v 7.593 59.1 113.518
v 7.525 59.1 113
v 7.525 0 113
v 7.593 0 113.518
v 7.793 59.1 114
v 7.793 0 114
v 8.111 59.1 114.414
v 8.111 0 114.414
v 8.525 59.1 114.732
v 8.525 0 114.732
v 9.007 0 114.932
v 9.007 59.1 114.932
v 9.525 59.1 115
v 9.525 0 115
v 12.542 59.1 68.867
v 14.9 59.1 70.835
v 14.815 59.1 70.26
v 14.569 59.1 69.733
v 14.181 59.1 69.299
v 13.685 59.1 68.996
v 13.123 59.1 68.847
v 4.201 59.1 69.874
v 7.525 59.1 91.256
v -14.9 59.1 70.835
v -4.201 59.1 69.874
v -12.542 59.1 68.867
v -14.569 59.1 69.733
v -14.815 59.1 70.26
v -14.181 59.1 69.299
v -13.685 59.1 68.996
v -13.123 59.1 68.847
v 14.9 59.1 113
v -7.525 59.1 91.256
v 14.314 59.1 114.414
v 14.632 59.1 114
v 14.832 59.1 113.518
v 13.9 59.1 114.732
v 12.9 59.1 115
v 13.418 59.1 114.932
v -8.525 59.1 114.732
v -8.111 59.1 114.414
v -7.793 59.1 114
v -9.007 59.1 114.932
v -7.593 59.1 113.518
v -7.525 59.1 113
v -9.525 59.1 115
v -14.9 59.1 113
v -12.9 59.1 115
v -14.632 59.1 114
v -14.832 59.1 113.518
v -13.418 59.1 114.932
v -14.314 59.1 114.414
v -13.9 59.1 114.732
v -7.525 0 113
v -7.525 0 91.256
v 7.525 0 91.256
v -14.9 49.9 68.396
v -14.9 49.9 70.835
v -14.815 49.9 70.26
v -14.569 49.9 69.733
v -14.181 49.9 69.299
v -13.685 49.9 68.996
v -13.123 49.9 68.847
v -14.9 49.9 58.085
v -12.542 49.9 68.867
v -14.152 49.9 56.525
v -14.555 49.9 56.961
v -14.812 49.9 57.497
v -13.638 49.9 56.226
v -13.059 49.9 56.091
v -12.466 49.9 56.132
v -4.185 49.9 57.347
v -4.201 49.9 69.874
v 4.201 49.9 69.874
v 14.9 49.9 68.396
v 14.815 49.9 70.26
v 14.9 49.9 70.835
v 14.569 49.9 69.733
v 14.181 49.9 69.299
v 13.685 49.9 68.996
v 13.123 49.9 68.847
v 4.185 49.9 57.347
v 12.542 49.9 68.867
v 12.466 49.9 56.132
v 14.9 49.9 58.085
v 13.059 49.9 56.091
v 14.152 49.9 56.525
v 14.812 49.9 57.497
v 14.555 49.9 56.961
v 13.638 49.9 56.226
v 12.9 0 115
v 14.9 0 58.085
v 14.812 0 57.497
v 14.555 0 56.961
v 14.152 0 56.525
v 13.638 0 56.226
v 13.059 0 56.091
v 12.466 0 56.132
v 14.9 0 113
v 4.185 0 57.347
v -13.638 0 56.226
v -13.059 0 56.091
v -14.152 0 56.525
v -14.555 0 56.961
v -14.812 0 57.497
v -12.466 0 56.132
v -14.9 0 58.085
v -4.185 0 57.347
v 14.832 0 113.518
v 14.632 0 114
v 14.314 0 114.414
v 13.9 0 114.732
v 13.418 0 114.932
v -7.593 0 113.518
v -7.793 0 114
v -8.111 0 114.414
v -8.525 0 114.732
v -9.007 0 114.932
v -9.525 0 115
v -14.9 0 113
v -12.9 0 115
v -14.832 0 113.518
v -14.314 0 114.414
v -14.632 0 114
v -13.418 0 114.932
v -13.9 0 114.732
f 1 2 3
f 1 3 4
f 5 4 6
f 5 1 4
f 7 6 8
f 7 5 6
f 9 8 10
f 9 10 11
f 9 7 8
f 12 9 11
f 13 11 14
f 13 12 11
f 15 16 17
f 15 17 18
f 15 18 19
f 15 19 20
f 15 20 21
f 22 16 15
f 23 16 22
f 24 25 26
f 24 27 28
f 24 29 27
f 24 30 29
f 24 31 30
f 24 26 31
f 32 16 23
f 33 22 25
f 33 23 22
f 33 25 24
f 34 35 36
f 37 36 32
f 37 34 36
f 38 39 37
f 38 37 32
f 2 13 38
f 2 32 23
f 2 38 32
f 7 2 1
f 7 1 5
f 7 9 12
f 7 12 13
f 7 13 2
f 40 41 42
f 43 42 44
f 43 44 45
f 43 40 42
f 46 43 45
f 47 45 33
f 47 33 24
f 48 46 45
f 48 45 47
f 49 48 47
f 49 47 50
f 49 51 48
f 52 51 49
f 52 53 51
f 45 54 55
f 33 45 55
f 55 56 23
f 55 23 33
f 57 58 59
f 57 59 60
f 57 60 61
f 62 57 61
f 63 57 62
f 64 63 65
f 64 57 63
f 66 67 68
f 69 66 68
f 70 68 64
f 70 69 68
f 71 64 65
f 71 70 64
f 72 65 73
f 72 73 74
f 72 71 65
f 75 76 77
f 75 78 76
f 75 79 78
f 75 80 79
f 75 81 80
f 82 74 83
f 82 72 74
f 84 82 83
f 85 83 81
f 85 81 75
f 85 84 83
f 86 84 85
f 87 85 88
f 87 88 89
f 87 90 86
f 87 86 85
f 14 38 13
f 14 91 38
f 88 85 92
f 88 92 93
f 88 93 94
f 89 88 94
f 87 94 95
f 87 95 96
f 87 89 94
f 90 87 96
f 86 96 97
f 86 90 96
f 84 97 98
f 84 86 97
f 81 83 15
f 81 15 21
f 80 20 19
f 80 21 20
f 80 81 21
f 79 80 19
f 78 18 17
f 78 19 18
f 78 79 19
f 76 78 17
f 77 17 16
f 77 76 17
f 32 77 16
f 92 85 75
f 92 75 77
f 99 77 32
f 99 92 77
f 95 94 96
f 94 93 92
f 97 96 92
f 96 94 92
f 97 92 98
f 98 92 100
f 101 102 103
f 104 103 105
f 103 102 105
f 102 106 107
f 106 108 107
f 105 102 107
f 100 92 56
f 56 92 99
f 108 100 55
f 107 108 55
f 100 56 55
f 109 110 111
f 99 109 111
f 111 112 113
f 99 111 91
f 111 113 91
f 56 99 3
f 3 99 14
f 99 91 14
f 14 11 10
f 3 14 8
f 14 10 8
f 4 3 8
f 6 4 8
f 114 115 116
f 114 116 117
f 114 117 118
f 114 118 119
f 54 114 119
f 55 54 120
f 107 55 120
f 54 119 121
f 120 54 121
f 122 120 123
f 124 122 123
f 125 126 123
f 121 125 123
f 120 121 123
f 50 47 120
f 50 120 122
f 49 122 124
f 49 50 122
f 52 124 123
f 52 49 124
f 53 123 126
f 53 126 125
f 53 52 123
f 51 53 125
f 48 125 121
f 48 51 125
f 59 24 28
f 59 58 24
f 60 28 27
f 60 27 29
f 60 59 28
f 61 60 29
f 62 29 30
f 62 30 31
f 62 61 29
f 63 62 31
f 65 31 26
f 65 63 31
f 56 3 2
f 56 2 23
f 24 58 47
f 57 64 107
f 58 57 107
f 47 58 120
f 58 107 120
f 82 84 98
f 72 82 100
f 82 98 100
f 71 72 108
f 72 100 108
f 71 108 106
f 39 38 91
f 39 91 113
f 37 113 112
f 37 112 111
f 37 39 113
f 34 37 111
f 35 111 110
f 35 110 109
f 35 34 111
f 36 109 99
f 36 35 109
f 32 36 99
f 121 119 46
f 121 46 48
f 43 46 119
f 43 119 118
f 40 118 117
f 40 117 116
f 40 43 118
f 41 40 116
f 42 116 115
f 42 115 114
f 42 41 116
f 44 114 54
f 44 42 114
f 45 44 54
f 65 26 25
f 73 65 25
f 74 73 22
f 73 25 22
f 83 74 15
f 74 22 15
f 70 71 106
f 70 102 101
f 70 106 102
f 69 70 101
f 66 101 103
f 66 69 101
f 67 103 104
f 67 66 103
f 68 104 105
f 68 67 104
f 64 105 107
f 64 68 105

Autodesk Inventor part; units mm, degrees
ref_plane "YZ Plane" through (0, 0, 0) normal (1, 0, 0) x (0, 1, 0)
ref_plane "XZ Plane" through (0, 0, 0) normal (0, 1, 0) x (-1, 0, 0)
ref_plane "XY Plane" through (0, 0, 0) normal (0, 0, 1) x (1, 0, 0)
sketch "スケッチ2" plane through (0, 0, 0) normal (0, 1, 0) x (-1, 0, 0)
  circle A0 centre (0, 0) radius 86.2565
  circle A1 centre (0, 0) radius 70
  circle A2 centre (0, 0) radius 57.5
  line L0 (0, 0) -> (0, 86.2565)
  line L1 (-14.9, 55.5359) -> (-14.9, 84.9598)
  line L2 (14.9, 55.5359) -> (14.9, 84.9598)
  line L3 (14.9, 84.9598) -> (-14.9, 84.9598)
  line L4 (-14.9, 84.9598) -> (-14.9, 115)
  line L5 (-14.9, 115) -> (14.9, 115)
  line L6 (14.9, 115) -> (14.9, 84.9598)
  line L7 (0, 115) -> (7.525, 115)
  line L8 (7.525, 115) -> (7.525, 91.2565)
  line L9 (7.525, 91.2565) -> (0, 91.2565)
  line L10 (0, 91.2565) -> (0, 115)
  line L11 (-7.525, 115) -> (-7.525, 91.2565)
  line L12 (-7.525, 91.2565) -> (0, 91.2565)
  dimension "d8" = 115
  dimension "d6" = 172.513
  dimension "d7" = 140
  dimension "d9" = 14.9
  dimension "d11" = 7.525
  dimension "d12" = 5
  dimension "d13" = 115
extrude "押し出し2" add sketch "スケッチ2" along normal blind 59.1 contours L3 L0 A0 | L2 A1 L0 L3 | A0 L4 L5 L11 L12 L9 L8 L6 | L3 L0 A1 L1 | A0 L0 L3 | L2 A2 L0 A1 | A1 L0 A2 L1
sketch "スケッチ3" plane through (0, 59.1, 0) normal (0, 1, 0) x (1, 0, 0)
  circle A0 centre (0, 0) radius 70
  arc A1 (-14.9, -55.5359) -> (14.9, -55.5359) centre (0, 0) ccw projected
  circle A2 centre (0, 0) radius 57.5
  line L0 (-14.9, -55.5359) -> (-14.9, -68.3958)
  line L1 (14.9, -55.5359) -> (14.9, -68.3958)
  dimension "d16" = 140
extrude "押し出し3" cut sketch "スケッチ3" against normal blind 9.2 contours L0 A1 L1 A0
fillet "フィレット1" radius 2 8 edges at (-7.525, 29.55, 115) (7.525, 29.55, 115) (14.9, 29.55, 115) (-14.9, 29.55, 115) (14.9, 54.5, 68.3958) (-14.9, 54.5, 68.3958) (14.9, 24.95, 55.5359) (-14.9, 24.95, 55.5359)
properties part number "zigu2"
